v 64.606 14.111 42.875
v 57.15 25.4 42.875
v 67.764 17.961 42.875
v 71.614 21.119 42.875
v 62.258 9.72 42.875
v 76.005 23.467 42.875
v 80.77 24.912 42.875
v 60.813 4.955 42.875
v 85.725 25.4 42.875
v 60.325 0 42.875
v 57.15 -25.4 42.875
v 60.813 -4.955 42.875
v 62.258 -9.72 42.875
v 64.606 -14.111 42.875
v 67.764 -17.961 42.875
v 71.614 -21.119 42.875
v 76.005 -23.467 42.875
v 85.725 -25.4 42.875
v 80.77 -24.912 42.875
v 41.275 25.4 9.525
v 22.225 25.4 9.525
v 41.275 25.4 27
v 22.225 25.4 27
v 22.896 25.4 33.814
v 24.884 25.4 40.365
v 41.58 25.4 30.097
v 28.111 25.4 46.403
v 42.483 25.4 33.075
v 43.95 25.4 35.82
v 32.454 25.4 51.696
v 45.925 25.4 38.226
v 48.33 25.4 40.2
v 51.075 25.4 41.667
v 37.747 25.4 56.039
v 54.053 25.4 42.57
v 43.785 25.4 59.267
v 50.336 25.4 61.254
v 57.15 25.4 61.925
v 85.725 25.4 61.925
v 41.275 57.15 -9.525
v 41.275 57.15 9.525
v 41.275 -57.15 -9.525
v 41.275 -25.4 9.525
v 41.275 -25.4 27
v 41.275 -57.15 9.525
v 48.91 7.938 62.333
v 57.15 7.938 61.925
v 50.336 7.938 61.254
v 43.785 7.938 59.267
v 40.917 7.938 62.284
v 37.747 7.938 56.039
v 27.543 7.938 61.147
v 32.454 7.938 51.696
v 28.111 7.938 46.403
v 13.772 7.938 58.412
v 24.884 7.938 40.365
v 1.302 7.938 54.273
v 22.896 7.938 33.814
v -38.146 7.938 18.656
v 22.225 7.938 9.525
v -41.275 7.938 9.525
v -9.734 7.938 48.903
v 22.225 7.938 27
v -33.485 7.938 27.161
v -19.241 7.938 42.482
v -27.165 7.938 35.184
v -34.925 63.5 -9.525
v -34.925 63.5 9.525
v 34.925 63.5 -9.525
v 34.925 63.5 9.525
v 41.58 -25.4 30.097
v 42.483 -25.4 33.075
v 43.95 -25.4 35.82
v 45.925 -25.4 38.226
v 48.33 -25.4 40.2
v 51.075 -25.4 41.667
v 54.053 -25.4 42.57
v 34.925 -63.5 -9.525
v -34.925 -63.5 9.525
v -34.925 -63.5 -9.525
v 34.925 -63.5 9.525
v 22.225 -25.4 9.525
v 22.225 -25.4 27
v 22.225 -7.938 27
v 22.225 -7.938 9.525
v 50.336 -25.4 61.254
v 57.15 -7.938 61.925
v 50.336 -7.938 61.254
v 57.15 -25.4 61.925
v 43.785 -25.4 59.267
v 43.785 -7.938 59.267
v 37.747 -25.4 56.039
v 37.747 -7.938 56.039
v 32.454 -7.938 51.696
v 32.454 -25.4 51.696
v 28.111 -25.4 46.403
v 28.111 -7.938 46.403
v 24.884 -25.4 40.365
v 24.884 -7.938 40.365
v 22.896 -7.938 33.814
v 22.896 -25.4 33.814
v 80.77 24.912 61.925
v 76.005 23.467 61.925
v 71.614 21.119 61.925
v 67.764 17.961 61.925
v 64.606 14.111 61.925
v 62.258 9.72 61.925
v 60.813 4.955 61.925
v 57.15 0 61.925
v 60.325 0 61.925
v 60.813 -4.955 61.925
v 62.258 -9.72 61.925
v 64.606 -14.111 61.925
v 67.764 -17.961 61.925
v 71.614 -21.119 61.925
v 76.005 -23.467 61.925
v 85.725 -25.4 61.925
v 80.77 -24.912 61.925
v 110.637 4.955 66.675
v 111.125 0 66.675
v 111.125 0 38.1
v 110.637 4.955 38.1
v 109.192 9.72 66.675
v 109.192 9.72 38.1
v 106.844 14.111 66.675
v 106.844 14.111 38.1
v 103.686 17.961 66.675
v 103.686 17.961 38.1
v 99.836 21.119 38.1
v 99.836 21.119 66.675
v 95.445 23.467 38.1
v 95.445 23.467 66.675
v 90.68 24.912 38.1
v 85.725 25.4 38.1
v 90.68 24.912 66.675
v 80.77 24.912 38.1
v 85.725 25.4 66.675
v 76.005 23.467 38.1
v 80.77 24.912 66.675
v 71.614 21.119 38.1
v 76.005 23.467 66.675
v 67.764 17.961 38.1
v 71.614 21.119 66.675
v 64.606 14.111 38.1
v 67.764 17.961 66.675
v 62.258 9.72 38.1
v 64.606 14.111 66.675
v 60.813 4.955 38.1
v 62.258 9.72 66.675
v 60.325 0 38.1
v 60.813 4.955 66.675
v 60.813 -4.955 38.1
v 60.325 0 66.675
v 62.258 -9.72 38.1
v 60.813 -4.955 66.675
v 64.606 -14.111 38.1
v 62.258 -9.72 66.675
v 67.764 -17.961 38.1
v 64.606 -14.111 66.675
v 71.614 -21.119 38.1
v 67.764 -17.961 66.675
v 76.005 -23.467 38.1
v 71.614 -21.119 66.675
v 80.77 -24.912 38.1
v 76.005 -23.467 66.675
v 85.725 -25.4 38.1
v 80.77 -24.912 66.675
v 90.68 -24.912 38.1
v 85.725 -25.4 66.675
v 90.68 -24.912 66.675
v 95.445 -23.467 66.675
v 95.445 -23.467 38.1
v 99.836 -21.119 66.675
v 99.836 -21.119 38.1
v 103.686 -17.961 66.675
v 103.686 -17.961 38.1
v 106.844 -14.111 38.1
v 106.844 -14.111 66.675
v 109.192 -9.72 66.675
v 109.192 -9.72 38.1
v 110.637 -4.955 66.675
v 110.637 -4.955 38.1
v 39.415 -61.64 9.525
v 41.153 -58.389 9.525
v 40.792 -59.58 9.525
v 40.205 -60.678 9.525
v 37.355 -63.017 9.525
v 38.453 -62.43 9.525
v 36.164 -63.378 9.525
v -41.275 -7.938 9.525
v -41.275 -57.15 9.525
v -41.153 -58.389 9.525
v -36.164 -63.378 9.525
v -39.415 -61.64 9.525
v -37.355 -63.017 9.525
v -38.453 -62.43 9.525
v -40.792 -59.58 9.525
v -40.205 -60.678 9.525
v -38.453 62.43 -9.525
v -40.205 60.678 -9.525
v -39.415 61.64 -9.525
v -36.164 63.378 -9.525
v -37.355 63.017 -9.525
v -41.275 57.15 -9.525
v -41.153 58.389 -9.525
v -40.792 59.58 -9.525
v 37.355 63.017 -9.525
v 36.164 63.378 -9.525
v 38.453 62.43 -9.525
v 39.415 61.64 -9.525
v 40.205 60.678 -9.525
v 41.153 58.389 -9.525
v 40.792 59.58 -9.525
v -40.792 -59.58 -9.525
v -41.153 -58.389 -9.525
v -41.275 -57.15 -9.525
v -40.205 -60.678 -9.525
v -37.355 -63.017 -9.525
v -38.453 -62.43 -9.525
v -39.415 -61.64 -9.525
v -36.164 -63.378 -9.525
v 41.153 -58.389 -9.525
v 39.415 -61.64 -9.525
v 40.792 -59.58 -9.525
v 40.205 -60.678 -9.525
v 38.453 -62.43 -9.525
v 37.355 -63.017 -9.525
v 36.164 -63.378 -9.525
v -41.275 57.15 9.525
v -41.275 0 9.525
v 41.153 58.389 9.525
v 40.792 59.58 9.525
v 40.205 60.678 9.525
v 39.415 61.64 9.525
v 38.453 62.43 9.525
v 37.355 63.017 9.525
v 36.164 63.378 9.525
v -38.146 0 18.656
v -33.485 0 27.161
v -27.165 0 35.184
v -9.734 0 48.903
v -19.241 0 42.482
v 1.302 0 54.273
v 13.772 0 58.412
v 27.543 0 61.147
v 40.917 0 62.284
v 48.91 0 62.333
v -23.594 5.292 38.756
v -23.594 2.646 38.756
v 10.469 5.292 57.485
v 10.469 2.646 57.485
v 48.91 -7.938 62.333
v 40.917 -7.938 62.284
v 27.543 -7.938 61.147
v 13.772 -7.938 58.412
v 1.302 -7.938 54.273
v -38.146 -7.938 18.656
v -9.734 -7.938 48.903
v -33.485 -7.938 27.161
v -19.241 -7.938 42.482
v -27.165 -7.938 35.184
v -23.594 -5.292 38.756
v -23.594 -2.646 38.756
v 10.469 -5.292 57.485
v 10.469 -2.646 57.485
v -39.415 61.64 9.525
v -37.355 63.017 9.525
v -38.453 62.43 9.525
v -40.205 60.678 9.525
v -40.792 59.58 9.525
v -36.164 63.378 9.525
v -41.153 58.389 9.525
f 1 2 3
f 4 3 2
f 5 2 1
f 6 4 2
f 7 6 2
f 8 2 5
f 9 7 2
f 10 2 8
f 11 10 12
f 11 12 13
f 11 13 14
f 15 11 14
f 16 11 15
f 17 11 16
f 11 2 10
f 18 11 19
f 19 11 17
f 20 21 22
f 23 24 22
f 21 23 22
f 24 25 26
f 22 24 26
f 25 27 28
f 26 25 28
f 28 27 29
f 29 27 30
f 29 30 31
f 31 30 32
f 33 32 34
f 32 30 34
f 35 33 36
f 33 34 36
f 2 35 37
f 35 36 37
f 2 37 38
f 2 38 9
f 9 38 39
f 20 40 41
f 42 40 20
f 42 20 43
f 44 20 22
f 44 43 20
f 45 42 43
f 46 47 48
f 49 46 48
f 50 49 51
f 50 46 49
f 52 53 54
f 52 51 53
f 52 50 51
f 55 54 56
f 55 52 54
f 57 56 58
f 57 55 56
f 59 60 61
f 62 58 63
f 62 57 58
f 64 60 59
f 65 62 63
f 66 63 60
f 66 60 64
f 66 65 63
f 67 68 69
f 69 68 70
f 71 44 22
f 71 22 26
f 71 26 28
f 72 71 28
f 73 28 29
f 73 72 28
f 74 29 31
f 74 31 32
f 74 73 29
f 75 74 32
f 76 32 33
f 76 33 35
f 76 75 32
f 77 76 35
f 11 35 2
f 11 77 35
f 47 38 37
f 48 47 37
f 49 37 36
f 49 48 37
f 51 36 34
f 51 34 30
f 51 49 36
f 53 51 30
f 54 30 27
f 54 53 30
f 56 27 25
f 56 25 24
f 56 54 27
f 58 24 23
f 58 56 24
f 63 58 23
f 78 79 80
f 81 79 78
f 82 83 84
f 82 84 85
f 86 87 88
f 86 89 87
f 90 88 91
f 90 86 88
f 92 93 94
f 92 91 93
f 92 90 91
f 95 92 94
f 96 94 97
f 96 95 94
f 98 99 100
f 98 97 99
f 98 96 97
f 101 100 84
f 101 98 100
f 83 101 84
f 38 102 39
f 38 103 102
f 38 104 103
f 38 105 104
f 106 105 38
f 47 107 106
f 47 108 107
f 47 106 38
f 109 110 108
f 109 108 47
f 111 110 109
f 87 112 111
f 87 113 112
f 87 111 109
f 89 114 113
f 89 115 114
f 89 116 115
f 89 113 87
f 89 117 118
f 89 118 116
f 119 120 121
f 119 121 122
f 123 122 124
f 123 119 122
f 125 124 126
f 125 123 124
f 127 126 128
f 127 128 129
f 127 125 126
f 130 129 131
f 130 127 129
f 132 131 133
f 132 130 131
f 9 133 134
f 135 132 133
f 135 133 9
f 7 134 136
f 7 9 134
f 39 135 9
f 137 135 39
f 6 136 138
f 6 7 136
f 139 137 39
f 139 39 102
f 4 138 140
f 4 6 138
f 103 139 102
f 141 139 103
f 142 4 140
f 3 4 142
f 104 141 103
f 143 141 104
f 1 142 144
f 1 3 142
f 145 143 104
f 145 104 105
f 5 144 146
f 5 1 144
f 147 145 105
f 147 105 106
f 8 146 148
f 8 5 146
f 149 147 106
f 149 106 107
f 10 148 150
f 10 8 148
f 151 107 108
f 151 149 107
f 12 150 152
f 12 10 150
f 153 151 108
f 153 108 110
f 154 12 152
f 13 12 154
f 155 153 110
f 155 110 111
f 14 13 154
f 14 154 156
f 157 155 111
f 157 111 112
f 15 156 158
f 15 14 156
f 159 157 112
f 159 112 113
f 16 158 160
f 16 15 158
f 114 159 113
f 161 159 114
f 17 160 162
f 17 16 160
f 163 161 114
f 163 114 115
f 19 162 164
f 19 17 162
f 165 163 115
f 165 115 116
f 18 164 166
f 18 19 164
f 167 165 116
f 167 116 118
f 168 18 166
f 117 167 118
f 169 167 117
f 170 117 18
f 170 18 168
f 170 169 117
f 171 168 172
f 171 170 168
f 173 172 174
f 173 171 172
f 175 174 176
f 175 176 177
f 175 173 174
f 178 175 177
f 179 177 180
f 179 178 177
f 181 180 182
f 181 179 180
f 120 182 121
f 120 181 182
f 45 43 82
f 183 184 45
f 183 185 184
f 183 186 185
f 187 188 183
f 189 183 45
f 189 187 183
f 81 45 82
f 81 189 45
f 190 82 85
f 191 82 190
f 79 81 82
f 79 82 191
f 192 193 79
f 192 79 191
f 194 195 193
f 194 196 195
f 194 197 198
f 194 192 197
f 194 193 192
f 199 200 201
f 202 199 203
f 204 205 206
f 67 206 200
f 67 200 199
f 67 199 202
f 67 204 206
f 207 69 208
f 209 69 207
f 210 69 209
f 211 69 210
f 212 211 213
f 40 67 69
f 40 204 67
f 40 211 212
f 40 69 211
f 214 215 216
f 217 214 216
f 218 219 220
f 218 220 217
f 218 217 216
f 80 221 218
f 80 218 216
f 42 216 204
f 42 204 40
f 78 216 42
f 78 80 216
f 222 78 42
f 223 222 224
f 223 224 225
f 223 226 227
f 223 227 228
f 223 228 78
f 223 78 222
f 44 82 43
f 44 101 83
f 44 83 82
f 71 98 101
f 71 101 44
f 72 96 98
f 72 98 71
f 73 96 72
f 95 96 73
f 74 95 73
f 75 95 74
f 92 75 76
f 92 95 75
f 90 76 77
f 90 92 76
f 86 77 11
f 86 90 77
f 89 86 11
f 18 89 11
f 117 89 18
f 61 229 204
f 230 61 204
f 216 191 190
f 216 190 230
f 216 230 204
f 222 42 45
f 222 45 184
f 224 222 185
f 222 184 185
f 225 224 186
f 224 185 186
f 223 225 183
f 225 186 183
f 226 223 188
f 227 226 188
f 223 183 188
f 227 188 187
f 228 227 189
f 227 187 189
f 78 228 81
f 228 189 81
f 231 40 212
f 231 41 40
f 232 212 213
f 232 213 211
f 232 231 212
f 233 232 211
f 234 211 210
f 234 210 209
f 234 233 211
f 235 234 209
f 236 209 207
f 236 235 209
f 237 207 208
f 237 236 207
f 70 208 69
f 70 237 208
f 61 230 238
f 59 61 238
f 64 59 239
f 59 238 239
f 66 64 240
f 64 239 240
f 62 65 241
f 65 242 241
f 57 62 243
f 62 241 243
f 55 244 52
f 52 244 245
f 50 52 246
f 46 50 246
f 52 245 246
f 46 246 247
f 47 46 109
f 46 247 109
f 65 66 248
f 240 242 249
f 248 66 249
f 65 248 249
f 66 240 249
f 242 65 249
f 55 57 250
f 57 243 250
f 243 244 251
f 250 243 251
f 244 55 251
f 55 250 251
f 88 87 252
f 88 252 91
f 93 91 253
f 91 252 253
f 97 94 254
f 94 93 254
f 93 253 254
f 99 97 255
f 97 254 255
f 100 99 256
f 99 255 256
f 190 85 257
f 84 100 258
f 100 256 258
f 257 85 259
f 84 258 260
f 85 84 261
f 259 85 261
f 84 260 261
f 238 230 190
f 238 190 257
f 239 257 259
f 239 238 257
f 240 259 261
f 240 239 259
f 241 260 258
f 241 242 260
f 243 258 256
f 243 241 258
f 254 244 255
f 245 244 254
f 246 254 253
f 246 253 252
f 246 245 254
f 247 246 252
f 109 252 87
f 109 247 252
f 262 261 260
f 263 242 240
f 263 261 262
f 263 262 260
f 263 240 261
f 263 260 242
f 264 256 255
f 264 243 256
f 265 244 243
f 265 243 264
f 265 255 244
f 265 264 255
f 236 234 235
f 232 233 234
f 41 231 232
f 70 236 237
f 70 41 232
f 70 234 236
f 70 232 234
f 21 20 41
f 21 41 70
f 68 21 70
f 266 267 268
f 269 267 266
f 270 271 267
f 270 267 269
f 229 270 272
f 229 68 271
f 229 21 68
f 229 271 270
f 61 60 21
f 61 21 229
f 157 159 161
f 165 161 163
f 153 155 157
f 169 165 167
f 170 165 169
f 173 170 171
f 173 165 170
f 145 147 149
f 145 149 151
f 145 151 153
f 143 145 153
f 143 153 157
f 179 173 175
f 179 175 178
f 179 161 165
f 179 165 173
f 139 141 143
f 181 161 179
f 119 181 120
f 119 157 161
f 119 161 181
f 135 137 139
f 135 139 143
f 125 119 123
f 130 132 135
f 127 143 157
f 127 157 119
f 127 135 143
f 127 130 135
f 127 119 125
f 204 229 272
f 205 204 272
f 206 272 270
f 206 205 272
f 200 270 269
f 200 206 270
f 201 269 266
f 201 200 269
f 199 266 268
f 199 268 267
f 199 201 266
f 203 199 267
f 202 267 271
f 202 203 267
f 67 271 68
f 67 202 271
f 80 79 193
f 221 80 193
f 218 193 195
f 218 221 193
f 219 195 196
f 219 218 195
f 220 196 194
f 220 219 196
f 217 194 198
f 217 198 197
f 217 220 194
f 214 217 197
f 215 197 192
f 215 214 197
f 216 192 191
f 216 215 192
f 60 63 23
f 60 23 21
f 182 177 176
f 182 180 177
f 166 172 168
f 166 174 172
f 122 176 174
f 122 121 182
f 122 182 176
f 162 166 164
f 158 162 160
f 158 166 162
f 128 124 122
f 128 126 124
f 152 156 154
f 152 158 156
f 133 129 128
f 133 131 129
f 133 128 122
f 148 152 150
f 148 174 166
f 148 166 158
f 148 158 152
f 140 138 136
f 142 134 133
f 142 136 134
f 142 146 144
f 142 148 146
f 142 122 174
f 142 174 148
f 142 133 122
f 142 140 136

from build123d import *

# Parameters (mm, degrees)
F1_DEPTH = 63.5
F0_W     = 25.4
F0_H     = 19.05
F2_DEPTH = 25.4
F3_DEPTH = 7.9375
F5_R     = 6.35


# Not quite as in the source:
# - a feature names something its author has since deleted; it is built from what else it names


with BuildPart() as f1:
    # F0 (on Front) → F1 (new body, symmetric)
    with BuildSketch(Plane.XZ):
        Polygon((-41.275, 9.525), (-41.275, -9.525), (41.275, -9.525), (41.275, 9.525), (22.225, 9.525), align=None)
    extrude(amount=F1_DEPTH, both=True)

    # F0 (on Front) → F2 (join, symmetric)
    with BuildSketch(Plane.XZ):
        with BuildLine():
            Line((22.225, 9.525), (41.275, 9.525))
            Line((41.275, 9.525), (41.275, 27.0002))
            ThreePointArc((41.275, 27.0002), (45.9246798487, 38.2255201513), (57.15, 42.8752))
            Line((57.15, 42.8752), (60.325, 42.8752))
            Line((60.325, 42.8752), (60.325, 61.9252))
            Line((60.325, 61.9252), (57.15, 61.9252))
            ThreePointArc((57.15, 61.9252), (32.4542956671, 51.6959043329), (22.225, 27.0002))
            Line((22.225, 27.0002), (22.225, 9.525))
        make_face()
        with Locations((73.025, 52.4002)):
            Rectangle(F0_W, F0_H)
    extrude(amount=F2_DEPTH, both=True)

    # F0 (on Front) → F3 (join, symmetric)
    with BuildSketch(Plane.XZ):
        with BuildLine():
            add(Edge.make_bspline(
                [(-41.275, 9.525), (-33.0378338695, 42.7445545793), (5.4129776545, 65.891072154), (57.15, 61.9252)],
                knots=[0, 0, 0, 0, 111.5045361635, 111.5045361635, 111.5045361635, 111.5045361635], degree=3))
            Line((-41.275, 9.525), (22.225, 9.525))
            Line((22.225, 9.525), (22.225, 27.0002))
            ThreePointArc((22.225, 27.0002), (32.4542956671, 51.6959043329), (57.15, 61.9252))
        make_face()
    extrude(amount=F3_DEPTH, both=True)

    # F0 (on Front) → F4 (revolve)
    with BuildSketch(Plane.XZ):
        Polygon((85.725, 66.675), (85.725, 61.9252), (85.725, 42.8752), (85.725, 38.1), (111.125, 38.1), (111.125, 66.675), align=None)
    revolve(axis=Axis((85.725, 0, 52.3875), (0, 0, 1)))

    # F5
    f5_edges = [f1.edges().sort_by_distance(p)[0] for p in [
        (41.275, -63.5, 0),
        (-41.275, -63.5, 0),
        (41.275, 63.5, 0),
        (-41.275, 63.5, 0),
    ]]
    fillet(f5_edges, radius=F5_R)


solid = f1.part
